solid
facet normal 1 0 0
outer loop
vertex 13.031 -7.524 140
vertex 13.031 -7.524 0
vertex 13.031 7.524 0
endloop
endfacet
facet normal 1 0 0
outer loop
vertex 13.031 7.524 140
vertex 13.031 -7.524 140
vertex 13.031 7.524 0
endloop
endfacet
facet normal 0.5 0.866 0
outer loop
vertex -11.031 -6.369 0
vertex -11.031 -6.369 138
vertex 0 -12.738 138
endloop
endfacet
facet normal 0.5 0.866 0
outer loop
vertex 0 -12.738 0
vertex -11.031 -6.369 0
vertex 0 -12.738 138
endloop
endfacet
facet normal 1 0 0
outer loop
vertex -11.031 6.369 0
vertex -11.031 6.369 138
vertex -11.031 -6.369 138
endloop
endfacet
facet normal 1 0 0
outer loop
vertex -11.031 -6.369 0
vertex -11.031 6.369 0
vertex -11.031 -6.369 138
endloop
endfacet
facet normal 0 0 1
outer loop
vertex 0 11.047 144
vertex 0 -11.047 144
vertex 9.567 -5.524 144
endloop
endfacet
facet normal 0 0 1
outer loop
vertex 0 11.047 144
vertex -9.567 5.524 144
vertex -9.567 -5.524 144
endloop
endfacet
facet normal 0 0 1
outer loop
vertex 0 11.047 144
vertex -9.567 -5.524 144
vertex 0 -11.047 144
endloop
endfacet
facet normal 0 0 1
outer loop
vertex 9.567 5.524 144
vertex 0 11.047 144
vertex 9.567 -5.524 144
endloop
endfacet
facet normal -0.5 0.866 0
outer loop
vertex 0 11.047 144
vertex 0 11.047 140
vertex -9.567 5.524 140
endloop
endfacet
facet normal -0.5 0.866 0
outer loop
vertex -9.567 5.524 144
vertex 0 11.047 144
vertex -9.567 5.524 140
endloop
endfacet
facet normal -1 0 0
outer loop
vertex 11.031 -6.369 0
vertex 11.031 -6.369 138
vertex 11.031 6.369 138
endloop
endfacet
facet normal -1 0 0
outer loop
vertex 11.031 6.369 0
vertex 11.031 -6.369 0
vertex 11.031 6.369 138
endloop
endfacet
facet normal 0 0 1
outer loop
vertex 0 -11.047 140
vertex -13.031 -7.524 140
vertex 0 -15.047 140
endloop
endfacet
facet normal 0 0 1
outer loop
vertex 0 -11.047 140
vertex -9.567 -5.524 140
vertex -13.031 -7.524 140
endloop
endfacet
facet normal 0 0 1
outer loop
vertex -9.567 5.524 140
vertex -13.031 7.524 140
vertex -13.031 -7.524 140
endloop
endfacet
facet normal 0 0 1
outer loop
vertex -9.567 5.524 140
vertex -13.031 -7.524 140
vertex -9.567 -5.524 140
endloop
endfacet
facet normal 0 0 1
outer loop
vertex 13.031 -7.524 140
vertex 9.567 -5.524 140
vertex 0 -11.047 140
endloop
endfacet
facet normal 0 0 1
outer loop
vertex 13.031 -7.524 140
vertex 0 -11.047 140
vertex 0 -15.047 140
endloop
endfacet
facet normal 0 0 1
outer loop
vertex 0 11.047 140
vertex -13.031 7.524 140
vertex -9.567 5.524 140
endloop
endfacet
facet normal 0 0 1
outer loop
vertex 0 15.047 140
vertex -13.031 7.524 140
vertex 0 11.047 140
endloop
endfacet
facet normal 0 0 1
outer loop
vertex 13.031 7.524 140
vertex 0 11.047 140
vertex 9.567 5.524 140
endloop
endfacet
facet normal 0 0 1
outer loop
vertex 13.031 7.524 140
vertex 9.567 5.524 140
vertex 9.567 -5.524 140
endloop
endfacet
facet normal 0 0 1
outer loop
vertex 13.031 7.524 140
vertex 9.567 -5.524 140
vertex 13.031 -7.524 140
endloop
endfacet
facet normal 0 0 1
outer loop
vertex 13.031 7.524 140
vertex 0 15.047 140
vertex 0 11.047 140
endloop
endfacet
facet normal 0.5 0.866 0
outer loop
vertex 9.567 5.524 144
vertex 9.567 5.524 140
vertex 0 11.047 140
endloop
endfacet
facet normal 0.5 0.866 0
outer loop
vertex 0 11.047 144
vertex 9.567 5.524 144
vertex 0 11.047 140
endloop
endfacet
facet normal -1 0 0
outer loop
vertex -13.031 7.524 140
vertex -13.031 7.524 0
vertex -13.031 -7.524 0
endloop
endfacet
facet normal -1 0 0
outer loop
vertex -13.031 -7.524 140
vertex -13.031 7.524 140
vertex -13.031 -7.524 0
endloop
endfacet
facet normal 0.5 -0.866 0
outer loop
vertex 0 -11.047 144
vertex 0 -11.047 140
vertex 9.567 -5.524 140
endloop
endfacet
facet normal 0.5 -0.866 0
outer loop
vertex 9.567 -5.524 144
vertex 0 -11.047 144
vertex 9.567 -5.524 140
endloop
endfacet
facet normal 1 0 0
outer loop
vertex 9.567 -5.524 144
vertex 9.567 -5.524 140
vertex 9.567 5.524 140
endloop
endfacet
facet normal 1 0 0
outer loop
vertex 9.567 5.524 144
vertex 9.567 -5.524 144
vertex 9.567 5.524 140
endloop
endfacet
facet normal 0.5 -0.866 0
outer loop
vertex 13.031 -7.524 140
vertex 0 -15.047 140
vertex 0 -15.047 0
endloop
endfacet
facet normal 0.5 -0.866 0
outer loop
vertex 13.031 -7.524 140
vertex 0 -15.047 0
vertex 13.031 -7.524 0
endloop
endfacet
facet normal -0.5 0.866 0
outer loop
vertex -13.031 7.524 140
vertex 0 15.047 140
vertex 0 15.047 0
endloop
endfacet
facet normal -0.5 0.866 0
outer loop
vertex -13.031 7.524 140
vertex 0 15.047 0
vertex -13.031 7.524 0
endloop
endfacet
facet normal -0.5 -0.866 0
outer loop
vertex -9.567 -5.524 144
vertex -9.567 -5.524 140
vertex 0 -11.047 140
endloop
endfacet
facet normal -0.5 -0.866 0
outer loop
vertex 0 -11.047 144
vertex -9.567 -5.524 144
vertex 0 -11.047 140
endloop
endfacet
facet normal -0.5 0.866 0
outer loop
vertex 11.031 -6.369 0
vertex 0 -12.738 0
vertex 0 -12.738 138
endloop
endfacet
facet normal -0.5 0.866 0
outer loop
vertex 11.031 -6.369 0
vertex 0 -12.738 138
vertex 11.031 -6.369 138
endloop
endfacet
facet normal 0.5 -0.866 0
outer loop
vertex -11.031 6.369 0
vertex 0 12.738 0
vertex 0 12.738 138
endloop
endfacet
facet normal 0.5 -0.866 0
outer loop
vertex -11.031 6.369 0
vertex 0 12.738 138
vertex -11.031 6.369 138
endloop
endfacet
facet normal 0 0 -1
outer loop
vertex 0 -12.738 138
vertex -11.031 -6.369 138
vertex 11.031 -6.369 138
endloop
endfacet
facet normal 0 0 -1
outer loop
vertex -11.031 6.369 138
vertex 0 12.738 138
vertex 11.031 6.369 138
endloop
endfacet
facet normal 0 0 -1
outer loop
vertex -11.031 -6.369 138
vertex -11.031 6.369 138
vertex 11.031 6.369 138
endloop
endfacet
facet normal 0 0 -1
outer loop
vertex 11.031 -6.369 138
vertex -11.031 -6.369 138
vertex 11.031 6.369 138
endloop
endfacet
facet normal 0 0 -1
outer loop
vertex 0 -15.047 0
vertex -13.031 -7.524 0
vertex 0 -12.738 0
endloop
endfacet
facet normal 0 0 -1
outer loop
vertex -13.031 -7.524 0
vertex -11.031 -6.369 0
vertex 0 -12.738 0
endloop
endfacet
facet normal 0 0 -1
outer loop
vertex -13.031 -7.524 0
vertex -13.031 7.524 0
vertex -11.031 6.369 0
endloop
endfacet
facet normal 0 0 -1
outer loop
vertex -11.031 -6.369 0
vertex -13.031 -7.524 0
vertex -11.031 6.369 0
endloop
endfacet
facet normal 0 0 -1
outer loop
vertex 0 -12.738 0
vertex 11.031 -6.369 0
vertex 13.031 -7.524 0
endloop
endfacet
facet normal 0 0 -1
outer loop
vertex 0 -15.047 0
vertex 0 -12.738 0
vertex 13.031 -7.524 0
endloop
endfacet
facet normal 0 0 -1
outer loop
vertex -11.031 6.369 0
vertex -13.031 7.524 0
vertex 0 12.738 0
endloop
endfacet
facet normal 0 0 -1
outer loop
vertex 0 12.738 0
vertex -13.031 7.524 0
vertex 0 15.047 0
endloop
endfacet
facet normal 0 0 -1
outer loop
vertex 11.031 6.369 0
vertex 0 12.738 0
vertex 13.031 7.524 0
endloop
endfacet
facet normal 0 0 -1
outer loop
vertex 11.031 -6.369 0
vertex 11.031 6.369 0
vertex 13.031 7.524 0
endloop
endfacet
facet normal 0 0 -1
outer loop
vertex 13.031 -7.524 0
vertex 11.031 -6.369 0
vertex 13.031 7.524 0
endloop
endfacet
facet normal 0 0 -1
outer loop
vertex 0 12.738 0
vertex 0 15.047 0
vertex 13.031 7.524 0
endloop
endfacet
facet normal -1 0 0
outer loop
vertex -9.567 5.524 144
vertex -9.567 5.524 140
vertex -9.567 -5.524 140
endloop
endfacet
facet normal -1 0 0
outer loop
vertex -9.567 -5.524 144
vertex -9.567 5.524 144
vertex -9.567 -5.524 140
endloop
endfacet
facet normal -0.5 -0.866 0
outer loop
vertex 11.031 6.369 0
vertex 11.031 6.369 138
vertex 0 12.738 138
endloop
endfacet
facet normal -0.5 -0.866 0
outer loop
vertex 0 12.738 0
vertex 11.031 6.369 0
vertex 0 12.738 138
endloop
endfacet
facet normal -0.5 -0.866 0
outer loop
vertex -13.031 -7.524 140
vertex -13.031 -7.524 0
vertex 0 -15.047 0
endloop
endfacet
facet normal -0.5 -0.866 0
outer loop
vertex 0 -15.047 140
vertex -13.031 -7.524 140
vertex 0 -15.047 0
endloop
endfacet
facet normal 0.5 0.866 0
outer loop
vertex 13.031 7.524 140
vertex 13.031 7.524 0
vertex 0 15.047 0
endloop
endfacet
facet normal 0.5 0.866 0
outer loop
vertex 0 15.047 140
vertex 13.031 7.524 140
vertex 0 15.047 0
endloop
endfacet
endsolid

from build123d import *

# Parameters (mm, degrees)
F1_DEPTH = 140
F2_T     = -2
F4_DEPTH = 4


with BuildPart() as f1:
    # F0 (on Top) → F1 (new body)
    with BuildSketch(Plane.XY):
        Polygon((0, -15.047), (13.031084, -7.5235), (13.031084, 7.5235), (0, 15.047), (-13.031084, 7.5235), (-13.031084, -7.5235), align=None)
    extrude(amount=F1_DEPTH)

    # F2
    f2_openings = [f1.faces().sort_by_distance(p)[0] for p in [
        (0, 0, 0),
    ]]
    offset(amount=F2_T, openings=f2_openings)

    # F3 (on face) → F4 (join)
    with BuildSketch(Plane.XY.offset(140)):
        Polygon((0, -11.047), (9.566983, -5.5235), (9.566983, 5.5235), (0, 11.047), (-9.566983, 5.5235), (-9.566983, -5.5235), align=None)
    extrude(amount=F4_DEPTH)


solid = f1.part
